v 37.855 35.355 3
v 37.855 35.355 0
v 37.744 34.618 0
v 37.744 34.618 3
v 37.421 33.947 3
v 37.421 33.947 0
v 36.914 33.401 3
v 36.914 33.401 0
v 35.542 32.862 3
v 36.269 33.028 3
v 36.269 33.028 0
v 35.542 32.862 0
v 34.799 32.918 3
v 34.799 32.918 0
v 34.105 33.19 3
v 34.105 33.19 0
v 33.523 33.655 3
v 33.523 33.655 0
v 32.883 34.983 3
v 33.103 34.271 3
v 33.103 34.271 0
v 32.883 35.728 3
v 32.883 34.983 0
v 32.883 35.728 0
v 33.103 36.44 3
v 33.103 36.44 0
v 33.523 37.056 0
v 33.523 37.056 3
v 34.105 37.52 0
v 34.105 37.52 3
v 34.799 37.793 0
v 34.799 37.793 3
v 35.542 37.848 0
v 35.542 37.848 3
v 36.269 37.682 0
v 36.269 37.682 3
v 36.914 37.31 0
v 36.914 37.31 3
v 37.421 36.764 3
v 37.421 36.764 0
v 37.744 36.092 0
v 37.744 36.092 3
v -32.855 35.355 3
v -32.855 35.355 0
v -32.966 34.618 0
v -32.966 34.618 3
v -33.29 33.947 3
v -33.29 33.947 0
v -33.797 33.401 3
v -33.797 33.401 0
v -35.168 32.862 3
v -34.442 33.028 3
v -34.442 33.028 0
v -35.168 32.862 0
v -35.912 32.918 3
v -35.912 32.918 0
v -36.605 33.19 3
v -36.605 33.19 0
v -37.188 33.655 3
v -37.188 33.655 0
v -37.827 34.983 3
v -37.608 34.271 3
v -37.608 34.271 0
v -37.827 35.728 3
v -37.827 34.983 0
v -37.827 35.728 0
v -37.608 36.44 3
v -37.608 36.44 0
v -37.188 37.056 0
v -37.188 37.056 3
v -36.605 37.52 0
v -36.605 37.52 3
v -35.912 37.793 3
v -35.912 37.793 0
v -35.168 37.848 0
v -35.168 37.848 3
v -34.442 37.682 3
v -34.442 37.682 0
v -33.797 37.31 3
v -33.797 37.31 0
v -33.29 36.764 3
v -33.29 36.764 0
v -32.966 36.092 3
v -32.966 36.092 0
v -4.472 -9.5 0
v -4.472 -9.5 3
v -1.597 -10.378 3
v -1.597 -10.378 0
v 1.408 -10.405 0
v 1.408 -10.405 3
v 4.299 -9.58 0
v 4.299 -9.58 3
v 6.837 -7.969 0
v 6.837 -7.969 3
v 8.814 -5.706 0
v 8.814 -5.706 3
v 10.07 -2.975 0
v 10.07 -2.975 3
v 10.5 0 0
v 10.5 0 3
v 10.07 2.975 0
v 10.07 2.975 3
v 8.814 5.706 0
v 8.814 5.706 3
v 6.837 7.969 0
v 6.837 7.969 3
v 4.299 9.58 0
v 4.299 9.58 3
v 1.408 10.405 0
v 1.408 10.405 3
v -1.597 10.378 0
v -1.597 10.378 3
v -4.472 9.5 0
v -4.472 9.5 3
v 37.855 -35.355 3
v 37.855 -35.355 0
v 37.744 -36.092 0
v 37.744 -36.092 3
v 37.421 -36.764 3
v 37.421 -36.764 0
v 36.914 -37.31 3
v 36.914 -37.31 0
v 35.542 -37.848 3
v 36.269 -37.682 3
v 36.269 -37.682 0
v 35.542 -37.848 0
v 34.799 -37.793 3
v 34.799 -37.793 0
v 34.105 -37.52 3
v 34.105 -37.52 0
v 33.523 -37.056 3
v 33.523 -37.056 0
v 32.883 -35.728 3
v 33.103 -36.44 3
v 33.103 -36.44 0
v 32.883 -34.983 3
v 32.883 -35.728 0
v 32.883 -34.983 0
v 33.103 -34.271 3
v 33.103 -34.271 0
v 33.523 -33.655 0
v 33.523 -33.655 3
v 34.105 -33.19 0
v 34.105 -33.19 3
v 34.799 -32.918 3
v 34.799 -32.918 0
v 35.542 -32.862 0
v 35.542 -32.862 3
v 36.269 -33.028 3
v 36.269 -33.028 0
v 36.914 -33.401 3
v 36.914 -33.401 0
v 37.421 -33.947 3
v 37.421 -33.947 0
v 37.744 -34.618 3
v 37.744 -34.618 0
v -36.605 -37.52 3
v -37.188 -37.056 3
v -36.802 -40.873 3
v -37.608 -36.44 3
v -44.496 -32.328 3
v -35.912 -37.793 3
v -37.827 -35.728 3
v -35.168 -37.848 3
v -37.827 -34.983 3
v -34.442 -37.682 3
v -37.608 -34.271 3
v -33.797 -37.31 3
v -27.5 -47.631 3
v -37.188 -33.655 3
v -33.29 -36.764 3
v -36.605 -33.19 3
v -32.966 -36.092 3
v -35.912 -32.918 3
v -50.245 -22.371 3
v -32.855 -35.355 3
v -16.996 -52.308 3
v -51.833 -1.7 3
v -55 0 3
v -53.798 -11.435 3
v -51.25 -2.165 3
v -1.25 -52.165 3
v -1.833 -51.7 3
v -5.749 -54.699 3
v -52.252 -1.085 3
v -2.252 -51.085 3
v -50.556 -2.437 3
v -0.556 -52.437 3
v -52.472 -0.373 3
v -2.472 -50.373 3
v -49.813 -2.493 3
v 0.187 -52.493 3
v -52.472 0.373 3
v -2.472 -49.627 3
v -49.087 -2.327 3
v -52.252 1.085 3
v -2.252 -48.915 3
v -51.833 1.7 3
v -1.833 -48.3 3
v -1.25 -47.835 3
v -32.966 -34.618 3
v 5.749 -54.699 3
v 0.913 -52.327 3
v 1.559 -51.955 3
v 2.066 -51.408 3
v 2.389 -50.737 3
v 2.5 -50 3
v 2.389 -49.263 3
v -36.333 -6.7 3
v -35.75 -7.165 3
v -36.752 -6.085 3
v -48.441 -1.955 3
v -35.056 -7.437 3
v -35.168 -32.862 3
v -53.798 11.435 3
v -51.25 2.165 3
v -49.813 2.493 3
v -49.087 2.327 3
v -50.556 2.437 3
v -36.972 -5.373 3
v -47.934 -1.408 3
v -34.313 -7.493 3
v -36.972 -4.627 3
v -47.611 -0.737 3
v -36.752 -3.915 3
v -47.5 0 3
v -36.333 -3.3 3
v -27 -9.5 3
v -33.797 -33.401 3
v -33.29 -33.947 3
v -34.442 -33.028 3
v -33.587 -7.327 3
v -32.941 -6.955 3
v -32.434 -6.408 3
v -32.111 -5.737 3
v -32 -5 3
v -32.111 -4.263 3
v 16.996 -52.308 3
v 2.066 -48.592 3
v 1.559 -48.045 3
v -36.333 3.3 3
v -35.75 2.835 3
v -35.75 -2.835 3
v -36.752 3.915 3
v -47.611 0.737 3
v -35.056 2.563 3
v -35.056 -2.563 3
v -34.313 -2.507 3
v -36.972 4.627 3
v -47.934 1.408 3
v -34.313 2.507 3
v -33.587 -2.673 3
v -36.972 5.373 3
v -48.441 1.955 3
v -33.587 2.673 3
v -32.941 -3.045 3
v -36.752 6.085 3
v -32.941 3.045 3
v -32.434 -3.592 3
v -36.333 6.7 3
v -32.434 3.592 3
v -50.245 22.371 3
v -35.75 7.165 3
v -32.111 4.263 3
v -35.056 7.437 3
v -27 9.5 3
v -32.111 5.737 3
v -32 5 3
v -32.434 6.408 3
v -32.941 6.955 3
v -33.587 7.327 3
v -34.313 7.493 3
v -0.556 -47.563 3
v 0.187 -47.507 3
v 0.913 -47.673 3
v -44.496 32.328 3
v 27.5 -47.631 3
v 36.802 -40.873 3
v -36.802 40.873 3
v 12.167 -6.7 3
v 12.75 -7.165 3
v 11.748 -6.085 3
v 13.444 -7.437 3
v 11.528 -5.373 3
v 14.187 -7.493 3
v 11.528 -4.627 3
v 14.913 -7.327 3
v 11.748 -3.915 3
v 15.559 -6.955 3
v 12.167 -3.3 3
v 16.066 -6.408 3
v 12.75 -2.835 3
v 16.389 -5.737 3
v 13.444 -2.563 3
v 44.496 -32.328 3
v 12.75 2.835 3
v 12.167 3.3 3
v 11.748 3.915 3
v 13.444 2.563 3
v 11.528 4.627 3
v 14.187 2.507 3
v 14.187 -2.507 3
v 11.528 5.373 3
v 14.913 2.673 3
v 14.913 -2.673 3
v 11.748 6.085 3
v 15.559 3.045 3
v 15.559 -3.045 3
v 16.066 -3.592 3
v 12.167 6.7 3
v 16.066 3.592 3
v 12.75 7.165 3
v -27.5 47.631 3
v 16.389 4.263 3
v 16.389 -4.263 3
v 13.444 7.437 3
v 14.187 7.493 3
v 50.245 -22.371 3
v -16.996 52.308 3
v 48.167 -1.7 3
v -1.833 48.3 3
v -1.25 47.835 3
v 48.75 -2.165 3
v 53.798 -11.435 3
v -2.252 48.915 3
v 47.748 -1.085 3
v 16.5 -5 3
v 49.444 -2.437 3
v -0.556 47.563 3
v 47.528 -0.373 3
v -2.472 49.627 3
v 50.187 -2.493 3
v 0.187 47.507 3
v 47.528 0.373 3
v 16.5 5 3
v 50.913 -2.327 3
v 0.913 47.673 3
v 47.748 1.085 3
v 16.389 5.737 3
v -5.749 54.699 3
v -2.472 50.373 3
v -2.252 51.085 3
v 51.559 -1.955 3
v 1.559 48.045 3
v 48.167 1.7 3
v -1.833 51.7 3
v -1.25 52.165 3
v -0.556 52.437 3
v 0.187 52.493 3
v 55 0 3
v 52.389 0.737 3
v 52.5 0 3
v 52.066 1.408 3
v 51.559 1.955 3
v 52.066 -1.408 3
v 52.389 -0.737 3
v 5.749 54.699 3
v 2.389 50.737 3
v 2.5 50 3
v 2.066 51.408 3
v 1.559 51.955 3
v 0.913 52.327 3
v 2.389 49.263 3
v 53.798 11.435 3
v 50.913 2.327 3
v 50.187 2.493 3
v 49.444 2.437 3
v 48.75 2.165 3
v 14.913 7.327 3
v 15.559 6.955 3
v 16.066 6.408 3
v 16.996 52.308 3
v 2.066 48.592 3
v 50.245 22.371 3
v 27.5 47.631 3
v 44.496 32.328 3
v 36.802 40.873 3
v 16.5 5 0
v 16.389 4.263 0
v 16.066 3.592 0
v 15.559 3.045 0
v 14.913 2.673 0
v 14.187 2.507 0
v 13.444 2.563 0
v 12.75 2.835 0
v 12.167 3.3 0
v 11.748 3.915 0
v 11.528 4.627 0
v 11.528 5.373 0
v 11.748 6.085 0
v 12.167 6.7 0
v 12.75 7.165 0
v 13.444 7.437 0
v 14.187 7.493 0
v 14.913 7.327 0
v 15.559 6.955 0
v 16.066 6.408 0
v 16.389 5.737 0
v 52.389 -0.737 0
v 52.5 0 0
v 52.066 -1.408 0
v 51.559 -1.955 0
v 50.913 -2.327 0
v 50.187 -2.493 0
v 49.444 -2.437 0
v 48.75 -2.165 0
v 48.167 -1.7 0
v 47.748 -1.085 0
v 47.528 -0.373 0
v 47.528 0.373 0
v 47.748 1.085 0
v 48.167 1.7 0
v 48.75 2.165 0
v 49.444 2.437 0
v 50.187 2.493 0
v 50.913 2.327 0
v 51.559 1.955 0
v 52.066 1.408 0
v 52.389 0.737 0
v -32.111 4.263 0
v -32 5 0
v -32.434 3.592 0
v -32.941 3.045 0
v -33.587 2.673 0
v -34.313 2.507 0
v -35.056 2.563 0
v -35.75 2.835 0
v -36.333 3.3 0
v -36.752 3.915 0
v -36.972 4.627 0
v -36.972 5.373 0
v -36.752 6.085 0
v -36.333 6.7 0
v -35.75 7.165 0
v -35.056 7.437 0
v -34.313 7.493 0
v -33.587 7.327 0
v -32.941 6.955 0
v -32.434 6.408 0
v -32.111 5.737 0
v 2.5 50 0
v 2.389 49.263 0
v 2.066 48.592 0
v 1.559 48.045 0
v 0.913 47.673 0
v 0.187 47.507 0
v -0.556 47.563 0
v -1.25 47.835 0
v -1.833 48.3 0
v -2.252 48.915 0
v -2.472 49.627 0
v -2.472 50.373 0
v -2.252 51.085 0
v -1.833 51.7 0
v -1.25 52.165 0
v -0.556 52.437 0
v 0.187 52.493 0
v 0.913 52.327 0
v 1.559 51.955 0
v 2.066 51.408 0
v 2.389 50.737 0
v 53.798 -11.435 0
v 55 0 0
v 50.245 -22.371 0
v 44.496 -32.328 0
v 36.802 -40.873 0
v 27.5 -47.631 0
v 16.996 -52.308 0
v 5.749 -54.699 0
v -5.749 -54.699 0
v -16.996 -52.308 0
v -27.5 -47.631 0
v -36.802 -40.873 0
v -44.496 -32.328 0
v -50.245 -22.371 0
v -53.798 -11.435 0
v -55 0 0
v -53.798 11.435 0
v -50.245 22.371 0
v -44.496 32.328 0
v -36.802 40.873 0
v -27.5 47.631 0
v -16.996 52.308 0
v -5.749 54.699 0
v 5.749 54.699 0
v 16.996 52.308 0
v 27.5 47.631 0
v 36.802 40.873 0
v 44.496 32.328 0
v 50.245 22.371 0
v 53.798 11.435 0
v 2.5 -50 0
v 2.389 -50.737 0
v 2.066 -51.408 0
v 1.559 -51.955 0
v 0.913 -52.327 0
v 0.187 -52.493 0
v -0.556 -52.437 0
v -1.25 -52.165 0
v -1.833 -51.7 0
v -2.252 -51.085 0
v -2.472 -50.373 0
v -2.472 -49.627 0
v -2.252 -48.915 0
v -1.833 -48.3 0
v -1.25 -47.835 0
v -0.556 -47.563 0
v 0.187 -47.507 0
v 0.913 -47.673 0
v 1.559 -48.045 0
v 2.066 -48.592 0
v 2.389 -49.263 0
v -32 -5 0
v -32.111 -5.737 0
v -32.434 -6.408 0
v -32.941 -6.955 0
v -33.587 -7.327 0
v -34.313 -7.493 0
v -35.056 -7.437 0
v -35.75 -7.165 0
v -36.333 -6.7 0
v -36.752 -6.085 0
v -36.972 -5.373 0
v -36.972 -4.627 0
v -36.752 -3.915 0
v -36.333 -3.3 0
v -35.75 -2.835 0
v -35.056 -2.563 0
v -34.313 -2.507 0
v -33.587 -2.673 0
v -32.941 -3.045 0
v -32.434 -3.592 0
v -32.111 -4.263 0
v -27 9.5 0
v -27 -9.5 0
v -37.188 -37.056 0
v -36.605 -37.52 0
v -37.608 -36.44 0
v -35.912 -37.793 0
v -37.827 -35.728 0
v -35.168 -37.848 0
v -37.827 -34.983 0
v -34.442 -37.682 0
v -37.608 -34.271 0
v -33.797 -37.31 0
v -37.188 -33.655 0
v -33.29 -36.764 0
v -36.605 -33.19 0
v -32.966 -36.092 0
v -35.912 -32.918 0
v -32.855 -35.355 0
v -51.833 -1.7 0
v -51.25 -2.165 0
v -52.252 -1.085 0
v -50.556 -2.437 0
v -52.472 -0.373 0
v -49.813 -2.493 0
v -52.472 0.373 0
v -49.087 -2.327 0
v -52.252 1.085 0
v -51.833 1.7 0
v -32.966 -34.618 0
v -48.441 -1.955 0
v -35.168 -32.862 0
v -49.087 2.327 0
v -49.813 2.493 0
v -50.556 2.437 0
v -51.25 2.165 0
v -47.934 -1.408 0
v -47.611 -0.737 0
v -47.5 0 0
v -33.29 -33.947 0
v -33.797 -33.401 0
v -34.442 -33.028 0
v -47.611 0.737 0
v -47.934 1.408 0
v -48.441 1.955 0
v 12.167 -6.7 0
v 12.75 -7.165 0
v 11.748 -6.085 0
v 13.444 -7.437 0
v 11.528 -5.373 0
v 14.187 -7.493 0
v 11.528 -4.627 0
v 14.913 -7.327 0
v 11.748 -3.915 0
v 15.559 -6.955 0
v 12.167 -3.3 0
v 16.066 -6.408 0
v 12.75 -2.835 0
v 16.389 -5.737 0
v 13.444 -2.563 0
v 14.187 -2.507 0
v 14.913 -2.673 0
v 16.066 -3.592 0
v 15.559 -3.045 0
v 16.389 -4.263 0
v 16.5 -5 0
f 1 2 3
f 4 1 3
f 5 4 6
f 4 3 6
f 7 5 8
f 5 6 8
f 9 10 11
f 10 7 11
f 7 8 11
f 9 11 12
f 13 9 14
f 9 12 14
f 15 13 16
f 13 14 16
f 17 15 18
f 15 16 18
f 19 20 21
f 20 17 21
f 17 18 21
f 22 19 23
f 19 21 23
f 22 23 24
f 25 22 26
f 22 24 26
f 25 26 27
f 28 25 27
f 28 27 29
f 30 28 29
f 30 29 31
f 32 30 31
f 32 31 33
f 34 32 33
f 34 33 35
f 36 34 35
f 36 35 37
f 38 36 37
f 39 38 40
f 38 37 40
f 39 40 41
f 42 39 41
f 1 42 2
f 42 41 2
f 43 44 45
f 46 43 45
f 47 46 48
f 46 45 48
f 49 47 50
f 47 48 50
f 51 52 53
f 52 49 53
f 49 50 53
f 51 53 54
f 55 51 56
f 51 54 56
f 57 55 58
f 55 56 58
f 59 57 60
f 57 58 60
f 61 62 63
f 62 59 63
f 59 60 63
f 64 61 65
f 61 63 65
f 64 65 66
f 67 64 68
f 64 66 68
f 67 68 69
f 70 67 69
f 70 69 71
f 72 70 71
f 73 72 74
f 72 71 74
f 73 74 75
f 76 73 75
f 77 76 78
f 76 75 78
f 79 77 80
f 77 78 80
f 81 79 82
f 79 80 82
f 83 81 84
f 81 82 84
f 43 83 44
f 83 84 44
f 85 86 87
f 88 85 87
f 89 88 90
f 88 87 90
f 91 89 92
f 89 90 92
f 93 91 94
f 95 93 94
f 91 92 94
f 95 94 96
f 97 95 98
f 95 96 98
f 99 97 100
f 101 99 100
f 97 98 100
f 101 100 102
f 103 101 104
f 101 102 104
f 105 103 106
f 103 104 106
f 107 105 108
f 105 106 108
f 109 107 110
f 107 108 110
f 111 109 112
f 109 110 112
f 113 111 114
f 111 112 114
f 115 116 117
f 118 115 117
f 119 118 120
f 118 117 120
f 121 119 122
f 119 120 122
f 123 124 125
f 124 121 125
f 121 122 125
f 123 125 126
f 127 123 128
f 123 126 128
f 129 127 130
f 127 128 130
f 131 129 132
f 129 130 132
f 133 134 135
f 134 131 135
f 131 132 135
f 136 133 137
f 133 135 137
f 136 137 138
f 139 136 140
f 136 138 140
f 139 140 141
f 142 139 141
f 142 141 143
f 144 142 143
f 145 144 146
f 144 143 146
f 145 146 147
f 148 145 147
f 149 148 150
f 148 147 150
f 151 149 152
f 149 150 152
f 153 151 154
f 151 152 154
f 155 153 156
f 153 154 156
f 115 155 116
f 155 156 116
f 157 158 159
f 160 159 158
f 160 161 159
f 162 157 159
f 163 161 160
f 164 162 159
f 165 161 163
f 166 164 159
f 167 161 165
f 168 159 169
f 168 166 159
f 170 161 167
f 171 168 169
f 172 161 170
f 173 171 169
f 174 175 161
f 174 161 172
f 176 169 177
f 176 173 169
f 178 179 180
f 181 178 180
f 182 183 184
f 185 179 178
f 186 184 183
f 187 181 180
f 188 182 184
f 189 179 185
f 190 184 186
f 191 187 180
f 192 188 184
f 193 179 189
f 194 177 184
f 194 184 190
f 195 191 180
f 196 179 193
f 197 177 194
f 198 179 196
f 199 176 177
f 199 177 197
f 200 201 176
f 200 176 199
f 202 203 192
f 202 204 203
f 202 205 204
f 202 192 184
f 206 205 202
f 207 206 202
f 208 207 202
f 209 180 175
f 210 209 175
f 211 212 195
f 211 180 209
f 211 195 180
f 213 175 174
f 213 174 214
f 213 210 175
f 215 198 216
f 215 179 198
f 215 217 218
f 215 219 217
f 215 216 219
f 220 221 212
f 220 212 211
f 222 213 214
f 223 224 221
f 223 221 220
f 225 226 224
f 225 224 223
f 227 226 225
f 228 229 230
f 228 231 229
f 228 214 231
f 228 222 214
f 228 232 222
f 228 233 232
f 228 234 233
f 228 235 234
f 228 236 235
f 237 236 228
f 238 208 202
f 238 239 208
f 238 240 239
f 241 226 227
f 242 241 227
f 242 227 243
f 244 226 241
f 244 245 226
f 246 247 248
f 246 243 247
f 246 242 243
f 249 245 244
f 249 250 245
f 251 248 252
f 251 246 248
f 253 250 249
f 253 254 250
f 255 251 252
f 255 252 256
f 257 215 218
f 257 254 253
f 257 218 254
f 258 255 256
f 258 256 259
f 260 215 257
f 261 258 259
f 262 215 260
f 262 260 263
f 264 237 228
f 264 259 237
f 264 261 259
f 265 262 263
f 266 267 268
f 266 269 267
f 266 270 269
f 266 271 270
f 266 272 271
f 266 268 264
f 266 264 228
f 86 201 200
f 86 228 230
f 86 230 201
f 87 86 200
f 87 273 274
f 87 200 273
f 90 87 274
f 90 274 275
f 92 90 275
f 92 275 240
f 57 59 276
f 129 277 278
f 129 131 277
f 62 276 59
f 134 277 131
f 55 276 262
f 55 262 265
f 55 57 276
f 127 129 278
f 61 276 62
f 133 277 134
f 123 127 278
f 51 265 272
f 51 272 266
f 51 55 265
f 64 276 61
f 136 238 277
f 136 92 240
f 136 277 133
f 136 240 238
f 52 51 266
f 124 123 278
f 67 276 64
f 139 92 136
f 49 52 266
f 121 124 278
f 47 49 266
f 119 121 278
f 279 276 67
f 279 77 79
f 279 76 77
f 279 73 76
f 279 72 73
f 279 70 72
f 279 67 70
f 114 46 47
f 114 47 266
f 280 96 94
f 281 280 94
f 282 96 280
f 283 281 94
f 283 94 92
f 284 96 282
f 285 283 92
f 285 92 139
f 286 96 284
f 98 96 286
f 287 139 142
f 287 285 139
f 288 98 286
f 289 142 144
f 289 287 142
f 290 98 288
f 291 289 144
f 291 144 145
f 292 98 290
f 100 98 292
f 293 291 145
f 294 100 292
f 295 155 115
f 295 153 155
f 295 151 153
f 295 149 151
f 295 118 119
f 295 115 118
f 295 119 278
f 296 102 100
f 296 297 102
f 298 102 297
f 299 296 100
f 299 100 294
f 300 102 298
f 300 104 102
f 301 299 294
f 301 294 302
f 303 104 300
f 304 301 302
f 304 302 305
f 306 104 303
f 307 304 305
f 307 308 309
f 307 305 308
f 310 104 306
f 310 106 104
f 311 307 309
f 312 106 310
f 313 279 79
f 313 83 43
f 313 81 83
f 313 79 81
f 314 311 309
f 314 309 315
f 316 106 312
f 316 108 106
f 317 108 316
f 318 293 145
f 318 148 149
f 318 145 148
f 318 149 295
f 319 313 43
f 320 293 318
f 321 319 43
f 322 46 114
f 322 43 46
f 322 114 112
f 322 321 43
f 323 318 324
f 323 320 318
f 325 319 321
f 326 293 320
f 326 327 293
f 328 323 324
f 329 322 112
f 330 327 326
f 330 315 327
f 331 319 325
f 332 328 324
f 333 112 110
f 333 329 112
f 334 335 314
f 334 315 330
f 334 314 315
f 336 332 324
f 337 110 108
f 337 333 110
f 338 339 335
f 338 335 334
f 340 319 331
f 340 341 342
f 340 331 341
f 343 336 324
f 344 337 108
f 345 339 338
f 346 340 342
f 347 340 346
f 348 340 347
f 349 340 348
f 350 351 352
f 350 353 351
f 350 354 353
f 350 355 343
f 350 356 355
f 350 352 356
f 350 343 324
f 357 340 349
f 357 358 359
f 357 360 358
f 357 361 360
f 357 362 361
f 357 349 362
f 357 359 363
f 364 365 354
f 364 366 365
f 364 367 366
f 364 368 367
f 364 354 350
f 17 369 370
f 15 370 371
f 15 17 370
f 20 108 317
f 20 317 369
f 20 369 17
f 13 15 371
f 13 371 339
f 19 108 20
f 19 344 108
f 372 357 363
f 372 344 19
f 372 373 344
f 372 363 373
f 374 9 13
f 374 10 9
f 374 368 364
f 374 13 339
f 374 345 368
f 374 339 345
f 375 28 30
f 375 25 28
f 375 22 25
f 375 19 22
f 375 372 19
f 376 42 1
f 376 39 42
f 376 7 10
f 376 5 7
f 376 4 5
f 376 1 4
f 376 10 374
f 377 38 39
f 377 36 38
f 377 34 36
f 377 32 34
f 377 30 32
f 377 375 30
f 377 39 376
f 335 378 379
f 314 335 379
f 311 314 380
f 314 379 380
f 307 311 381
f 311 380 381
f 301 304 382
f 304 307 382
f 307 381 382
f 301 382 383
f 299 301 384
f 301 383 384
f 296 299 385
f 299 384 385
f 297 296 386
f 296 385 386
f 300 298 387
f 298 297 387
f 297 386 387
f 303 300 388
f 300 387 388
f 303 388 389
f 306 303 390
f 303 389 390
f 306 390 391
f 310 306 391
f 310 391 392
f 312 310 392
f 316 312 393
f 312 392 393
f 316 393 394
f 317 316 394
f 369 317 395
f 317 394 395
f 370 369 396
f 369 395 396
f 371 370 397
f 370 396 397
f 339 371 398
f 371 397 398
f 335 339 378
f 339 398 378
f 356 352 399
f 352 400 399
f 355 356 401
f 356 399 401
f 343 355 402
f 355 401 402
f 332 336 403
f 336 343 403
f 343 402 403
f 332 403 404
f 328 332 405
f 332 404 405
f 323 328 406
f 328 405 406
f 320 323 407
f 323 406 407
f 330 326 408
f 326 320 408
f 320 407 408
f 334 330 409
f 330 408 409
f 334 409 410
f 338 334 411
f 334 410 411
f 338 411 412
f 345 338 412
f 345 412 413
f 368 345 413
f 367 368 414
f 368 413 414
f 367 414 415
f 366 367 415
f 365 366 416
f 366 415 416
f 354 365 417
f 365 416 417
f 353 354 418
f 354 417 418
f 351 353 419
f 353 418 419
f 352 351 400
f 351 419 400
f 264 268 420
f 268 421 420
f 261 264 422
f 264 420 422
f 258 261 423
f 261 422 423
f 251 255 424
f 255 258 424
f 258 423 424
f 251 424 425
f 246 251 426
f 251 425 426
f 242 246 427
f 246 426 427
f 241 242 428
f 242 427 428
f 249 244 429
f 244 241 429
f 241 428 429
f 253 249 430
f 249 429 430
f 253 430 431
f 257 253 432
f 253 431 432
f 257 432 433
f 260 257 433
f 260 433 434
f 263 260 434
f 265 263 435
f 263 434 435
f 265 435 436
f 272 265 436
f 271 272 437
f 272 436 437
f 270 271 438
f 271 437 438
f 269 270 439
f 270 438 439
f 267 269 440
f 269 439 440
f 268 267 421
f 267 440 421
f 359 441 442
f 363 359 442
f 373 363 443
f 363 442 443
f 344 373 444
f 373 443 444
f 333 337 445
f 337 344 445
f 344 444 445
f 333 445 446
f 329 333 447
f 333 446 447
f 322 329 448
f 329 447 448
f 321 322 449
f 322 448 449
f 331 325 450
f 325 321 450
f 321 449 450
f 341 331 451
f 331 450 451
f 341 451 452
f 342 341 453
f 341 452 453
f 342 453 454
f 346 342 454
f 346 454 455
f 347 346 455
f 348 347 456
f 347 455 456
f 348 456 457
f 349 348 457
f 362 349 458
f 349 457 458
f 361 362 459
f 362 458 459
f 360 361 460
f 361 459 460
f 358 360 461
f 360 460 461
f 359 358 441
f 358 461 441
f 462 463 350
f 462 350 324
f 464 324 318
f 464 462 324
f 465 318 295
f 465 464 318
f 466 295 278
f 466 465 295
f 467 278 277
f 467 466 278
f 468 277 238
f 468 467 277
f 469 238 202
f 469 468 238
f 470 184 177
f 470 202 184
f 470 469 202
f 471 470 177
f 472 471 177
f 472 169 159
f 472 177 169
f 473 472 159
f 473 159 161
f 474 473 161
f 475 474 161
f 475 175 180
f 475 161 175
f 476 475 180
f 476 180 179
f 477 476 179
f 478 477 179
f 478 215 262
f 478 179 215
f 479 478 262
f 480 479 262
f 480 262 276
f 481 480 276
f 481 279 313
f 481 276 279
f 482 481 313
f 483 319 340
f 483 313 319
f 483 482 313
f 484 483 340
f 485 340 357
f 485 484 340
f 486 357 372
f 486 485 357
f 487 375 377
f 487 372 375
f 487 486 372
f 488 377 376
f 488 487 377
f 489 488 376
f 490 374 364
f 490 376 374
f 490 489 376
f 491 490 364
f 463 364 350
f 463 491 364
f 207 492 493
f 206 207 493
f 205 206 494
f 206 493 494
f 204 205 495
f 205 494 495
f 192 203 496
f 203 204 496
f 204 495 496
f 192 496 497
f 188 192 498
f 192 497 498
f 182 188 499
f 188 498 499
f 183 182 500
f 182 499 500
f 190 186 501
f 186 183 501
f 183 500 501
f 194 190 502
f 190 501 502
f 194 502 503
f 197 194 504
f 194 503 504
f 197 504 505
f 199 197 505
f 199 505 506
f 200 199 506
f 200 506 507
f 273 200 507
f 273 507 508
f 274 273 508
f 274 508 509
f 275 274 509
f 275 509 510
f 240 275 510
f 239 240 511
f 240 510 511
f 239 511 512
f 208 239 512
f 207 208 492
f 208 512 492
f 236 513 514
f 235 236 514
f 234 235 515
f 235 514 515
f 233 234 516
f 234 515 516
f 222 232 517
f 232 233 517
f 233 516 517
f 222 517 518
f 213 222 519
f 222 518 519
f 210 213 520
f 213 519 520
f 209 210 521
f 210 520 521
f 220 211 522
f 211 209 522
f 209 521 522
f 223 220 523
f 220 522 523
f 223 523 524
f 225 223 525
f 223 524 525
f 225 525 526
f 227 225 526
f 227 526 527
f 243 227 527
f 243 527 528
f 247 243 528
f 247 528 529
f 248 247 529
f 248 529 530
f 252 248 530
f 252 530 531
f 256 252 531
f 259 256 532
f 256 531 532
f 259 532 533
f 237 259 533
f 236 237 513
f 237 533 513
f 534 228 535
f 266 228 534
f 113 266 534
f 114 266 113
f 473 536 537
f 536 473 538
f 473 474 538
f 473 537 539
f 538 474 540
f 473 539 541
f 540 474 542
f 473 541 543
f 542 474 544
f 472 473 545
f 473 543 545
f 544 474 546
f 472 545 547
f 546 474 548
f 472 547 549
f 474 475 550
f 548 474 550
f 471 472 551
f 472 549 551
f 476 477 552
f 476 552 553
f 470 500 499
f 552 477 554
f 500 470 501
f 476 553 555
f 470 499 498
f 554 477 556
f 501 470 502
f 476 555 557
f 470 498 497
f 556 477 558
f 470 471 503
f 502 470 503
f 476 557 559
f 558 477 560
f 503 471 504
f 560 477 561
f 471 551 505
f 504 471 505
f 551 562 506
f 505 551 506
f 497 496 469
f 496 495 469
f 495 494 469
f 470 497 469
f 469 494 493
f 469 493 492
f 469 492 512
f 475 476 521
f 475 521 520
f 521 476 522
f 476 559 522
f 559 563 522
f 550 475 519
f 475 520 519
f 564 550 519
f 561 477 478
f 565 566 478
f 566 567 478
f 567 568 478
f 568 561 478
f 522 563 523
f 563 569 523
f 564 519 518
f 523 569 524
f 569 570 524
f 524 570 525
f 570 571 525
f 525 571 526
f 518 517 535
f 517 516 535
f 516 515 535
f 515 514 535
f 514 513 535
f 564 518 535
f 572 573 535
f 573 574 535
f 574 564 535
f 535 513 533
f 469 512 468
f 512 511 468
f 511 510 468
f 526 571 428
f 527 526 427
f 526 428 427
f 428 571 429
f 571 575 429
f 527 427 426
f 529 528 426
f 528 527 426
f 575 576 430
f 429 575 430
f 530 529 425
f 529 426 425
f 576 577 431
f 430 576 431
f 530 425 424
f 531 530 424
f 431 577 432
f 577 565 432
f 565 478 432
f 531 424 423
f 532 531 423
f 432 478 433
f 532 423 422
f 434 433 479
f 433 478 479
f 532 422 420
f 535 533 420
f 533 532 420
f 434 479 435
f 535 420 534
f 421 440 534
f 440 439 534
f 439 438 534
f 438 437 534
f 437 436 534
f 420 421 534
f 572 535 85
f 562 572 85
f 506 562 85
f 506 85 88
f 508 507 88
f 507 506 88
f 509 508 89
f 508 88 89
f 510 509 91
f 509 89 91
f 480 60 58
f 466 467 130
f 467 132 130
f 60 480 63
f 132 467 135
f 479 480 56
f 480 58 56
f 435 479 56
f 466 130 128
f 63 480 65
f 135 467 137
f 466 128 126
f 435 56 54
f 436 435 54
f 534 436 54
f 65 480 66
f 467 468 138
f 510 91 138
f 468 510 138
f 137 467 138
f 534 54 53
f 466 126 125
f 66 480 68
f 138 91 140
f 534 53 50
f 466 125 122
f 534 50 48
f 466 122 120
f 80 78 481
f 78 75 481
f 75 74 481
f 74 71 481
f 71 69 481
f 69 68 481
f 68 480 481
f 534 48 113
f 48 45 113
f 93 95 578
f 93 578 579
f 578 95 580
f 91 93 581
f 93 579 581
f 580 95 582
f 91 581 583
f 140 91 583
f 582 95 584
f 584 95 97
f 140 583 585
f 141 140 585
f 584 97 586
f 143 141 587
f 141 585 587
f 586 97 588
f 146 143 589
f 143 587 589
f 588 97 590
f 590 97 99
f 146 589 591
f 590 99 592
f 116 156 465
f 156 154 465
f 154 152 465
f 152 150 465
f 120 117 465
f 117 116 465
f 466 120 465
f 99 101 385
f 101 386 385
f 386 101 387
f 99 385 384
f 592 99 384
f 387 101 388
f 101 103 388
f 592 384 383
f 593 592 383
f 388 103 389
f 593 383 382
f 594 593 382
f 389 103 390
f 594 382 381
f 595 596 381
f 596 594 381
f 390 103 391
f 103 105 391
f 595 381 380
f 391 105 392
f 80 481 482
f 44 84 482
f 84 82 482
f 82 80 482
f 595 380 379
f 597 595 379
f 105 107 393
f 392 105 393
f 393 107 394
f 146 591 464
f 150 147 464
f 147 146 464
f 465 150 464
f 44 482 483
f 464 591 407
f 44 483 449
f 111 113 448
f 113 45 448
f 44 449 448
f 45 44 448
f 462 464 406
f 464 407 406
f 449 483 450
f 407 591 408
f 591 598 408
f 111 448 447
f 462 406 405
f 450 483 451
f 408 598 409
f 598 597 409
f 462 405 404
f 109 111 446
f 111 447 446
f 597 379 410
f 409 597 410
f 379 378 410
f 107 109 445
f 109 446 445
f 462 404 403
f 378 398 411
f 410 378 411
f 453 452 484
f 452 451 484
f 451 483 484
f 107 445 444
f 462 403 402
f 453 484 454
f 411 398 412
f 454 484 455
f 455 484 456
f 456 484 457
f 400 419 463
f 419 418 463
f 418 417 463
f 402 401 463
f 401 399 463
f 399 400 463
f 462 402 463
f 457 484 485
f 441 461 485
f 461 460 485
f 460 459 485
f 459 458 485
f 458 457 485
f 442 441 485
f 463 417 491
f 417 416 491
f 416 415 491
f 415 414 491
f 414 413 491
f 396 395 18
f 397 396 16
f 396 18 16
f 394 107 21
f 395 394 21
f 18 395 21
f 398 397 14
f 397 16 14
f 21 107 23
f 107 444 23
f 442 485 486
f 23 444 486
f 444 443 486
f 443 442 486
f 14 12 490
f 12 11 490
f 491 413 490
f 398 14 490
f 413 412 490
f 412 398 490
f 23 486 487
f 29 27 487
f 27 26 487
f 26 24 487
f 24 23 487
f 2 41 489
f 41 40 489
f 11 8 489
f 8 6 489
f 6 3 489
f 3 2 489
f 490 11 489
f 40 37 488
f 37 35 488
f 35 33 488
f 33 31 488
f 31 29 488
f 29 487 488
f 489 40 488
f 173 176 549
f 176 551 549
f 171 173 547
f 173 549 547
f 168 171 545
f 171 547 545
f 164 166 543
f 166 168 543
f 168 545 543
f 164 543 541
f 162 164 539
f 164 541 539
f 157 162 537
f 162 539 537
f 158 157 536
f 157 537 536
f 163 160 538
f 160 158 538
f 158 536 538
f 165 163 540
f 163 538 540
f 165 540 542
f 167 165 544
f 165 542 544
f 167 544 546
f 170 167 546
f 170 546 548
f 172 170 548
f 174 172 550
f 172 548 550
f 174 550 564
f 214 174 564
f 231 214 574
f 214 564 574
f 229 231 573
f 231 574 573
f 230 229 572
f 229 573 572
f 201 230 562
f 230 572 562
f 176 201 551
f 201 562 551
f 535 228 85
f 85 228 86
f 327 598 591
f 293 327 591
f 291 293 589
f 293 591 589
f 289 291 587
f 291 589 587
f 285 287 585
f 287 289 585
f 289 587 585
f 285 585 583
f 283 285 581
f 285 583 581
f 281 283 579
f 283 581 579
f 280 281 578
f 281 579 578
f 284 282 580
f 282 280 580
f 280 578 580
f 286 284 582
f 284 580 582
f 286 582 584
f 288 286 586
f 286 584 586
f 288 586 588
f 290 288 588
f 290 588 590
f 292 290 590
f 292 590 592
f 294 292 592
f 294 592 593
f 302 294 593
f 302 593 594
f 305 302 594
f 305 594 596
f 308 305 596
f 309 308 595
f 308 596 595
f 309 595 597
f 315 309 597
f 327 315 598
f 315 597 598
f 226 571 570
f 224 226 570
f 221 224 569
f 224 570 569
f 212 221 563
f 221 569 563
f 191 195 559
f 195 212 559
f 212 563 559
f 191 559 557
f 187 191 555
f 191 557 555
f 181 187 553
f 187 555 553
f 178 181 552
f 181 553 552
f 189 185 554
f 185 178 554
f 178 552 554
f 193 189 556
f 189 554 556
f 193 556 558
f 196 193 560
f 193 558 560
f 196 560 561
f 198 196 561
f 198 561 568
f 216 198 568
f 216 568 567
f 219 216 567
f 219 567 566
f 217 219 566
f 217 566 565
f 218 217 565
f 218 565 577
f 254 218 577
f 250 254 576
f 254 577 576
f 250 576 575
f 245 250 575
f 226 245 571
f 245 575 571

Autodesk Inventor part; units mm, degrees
ref_plane "YZ Plane" through (0, 0, 0) normal (1, 0, 0) x (0, 1, 0)
ref_plane "XZ Plane" through (0, 0, 0) normal (0, 1, 0) x (-1, 0, 0)
ref_plane "XY Plane" through (0, 0, 0) normal (0, 0, 1) x (1, 0, 0)
sketch "Boceto1" plane through (0, 0, 0) normal (0, 0, 1) x (1, 0, 0)
  circle A0 centre (0, 0) radius 55
  circle A1 centre (0, 0) radius 6.5
  circle A2 centre (0, 50) radius 2.5
  circle A3 centre (-35.3553, 35.3553) radius 2.5
  circle A4 centre (-50, 0) radius 2.5
  circle A5 centre (-35.3553, -35.3553) radius 2.5
  circle A6 centre (0, -50) radius 2.5
  circle A7 centre (35.3553, -35.3553) radius 2.5
  circle A8 centre (50, 0) radius 2.5
  circle A9 centre (35.3553, 35.3553) radius 2.5
  line L0 (0, 0) -> (14, 0)
  circle A10 centre (14, 5) radius 2.5
  circle A11 centre (14, -5) radius 2.5
  circle A12 centre (-34.5, 5) radius 2.5
  circle A13 centre (-34.5, -5) radius 2.5
  dimension "d7" = 360
extrude "Extrusión1" add sketch "Boceto1" along normal blind 3
sketch "Boceto2" plane through (0, 0, 3) normal (0, 0, 1) x (1, 0, 0)
  point P0 (0, 0)
sketch "Boceto3" plane through (0, 0, 3) normal (0, 0, 1) x (1, 0, 0)
  arc A0 (-4.4721, -9.5) -> (-4.4721, 9.5) centre (0, 0) ccw
  line L0 (-27, 0) -> (-27, -9.5)
  line L1 (-27, -9.5) -> (-27, 9.5)
  line L2 (-27, 9.5) -> (-4.4721, 9.5)
  line L3 (-27, -9.5) -> (-4.4721, -9.5)
extrude "Extrusión2" cut sketch "Boceto3" against normal blind 3
properties part number "Base1"
